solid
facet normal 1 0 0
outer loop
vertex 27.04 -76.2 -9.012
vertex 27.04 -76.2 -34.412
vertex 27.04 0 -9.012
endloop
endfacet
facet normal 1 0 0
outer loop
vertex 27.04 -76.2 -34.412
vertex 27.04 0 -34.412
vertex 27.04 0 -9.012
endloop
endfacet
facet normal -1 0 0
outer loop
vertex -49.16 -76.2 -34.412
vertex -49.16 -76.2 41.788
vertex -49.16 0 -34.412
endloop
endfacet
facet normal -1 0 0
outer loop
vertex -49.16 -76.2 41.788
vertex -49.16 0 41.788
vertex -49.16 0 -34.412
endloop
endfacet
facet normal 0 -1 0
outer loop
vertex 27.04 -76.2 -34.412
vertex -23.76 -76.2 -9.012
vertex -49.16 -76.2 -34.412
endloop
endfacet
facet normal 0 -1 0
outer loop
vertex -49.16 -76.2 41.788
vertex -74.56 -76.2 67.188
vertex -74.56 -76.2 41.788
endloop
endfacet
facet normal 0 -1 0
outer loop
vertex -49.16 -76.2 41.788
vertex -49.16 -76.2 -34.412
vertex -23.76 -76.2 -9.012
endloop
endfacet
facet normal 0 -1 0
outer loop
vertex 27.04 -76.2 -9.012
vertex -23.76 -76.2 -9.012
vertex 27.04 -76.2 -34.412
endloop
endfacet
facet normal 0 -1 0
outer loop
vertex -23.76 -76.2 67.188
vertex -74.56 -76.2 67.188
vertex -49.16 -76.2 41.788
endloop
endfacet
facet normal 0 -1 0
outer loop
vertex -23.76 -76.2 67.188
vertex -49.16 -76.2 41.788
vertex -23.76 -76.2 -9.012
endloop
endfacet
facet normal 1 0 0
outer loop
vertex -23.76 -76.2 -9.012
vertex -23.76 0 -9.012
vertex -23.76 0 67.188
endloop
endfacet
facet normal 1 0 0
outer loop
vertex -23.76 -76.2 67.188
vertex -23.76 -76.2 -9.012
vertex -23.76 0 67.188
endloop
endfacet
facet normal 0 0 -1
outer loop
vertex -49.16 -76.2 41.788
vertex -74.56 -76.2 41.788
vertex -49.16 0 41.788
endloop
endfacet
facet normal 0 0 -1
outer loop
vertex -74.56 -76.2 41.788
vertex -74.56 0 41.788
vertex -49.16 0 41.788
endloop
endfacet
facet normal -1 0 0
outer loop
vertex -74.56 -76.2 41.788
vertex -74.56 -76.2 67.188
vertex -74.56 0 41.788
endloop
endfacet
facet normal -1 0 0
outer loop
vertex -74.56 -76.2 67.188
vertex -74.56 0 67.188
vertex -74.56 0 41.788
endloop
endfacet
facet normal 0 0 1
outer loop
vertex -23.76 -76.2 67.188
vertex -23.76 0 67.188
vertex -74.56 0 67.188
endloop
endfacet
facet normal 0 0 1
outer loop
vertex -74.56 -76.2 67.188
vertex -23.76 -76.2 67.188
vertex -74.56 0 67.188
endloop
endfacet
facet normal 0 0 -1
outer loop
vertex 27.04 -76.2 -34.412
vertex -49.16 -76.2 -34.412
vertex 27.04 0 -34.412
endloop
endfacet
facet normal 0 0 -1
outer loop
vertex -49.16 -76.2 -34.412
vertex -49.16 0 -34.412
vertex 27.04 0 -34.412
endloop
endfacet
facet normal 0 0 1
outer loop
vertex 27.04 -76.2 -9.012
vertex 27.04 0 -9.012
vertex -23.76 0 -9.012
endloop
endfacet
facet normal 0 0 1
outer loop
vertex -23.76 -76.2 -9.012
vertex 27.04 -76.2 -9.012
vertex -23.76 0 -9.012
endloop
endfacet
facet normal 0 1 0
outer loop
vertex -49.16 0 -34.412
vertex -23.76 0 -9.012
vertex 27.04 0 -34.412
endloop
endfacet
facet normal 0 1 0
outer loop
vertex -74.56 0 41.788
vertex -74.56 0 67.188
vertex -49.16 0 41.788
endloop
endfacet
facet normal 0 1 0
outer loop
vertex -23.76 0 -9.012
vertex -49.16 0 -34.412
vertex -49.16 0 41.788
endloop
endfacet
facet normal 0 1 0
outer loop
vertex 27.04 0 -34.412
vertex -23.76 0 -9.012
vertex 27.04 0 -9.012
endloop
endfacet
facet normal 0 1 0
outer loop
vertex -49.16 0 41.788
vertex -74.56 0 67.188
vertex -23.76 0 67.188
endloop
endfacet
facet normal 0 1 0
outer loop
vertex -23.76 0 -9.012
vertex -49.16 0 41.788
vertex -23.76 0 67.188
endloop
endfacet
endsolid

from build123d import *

# Parameters (mm, degrees)
F1_DEPTH = 25.4
F2_DEPTH = 25.4
F3_DEPTH = 25.4


with BuildPart() as f1:
    # F0 (on Front) → F1 (new body)
    with BuildSketch(Plane.XZ):
        Polygon((-23.7604218155, 67.1883597866), (-74.5604218155, 67.1883597866), (-74.5604218155, 41.7883597866), (-49.1604218155, 41.7883597866), (-49.1604218155, -34.4116402134), (27.0395781845, -34.4116402134), (27.0395781845, -9.0116402134), (-23.7604218155, -9.0116402134), align=None)
    extrude(amount=F1_DEPTH)

    # F2 (add): a face of the model
    f2_faces = [f1.faces().sort_by_distance(p)[0] for p in [
        (-29.2032789584, -25.4, 10.9455026437),
    ]]
    extrude(f2_faces, amount=F2_DEPTH)

    # F3 (add): a face of the model
    f3_faces = [f1.faces().sort_by_distance(p)[0] for p in [
        (-29.2032789584, -50.8, 10.9455026437),
    ]]
    extrude(f3_faces, amount=F3_DEPTH)


solid = f1.part
